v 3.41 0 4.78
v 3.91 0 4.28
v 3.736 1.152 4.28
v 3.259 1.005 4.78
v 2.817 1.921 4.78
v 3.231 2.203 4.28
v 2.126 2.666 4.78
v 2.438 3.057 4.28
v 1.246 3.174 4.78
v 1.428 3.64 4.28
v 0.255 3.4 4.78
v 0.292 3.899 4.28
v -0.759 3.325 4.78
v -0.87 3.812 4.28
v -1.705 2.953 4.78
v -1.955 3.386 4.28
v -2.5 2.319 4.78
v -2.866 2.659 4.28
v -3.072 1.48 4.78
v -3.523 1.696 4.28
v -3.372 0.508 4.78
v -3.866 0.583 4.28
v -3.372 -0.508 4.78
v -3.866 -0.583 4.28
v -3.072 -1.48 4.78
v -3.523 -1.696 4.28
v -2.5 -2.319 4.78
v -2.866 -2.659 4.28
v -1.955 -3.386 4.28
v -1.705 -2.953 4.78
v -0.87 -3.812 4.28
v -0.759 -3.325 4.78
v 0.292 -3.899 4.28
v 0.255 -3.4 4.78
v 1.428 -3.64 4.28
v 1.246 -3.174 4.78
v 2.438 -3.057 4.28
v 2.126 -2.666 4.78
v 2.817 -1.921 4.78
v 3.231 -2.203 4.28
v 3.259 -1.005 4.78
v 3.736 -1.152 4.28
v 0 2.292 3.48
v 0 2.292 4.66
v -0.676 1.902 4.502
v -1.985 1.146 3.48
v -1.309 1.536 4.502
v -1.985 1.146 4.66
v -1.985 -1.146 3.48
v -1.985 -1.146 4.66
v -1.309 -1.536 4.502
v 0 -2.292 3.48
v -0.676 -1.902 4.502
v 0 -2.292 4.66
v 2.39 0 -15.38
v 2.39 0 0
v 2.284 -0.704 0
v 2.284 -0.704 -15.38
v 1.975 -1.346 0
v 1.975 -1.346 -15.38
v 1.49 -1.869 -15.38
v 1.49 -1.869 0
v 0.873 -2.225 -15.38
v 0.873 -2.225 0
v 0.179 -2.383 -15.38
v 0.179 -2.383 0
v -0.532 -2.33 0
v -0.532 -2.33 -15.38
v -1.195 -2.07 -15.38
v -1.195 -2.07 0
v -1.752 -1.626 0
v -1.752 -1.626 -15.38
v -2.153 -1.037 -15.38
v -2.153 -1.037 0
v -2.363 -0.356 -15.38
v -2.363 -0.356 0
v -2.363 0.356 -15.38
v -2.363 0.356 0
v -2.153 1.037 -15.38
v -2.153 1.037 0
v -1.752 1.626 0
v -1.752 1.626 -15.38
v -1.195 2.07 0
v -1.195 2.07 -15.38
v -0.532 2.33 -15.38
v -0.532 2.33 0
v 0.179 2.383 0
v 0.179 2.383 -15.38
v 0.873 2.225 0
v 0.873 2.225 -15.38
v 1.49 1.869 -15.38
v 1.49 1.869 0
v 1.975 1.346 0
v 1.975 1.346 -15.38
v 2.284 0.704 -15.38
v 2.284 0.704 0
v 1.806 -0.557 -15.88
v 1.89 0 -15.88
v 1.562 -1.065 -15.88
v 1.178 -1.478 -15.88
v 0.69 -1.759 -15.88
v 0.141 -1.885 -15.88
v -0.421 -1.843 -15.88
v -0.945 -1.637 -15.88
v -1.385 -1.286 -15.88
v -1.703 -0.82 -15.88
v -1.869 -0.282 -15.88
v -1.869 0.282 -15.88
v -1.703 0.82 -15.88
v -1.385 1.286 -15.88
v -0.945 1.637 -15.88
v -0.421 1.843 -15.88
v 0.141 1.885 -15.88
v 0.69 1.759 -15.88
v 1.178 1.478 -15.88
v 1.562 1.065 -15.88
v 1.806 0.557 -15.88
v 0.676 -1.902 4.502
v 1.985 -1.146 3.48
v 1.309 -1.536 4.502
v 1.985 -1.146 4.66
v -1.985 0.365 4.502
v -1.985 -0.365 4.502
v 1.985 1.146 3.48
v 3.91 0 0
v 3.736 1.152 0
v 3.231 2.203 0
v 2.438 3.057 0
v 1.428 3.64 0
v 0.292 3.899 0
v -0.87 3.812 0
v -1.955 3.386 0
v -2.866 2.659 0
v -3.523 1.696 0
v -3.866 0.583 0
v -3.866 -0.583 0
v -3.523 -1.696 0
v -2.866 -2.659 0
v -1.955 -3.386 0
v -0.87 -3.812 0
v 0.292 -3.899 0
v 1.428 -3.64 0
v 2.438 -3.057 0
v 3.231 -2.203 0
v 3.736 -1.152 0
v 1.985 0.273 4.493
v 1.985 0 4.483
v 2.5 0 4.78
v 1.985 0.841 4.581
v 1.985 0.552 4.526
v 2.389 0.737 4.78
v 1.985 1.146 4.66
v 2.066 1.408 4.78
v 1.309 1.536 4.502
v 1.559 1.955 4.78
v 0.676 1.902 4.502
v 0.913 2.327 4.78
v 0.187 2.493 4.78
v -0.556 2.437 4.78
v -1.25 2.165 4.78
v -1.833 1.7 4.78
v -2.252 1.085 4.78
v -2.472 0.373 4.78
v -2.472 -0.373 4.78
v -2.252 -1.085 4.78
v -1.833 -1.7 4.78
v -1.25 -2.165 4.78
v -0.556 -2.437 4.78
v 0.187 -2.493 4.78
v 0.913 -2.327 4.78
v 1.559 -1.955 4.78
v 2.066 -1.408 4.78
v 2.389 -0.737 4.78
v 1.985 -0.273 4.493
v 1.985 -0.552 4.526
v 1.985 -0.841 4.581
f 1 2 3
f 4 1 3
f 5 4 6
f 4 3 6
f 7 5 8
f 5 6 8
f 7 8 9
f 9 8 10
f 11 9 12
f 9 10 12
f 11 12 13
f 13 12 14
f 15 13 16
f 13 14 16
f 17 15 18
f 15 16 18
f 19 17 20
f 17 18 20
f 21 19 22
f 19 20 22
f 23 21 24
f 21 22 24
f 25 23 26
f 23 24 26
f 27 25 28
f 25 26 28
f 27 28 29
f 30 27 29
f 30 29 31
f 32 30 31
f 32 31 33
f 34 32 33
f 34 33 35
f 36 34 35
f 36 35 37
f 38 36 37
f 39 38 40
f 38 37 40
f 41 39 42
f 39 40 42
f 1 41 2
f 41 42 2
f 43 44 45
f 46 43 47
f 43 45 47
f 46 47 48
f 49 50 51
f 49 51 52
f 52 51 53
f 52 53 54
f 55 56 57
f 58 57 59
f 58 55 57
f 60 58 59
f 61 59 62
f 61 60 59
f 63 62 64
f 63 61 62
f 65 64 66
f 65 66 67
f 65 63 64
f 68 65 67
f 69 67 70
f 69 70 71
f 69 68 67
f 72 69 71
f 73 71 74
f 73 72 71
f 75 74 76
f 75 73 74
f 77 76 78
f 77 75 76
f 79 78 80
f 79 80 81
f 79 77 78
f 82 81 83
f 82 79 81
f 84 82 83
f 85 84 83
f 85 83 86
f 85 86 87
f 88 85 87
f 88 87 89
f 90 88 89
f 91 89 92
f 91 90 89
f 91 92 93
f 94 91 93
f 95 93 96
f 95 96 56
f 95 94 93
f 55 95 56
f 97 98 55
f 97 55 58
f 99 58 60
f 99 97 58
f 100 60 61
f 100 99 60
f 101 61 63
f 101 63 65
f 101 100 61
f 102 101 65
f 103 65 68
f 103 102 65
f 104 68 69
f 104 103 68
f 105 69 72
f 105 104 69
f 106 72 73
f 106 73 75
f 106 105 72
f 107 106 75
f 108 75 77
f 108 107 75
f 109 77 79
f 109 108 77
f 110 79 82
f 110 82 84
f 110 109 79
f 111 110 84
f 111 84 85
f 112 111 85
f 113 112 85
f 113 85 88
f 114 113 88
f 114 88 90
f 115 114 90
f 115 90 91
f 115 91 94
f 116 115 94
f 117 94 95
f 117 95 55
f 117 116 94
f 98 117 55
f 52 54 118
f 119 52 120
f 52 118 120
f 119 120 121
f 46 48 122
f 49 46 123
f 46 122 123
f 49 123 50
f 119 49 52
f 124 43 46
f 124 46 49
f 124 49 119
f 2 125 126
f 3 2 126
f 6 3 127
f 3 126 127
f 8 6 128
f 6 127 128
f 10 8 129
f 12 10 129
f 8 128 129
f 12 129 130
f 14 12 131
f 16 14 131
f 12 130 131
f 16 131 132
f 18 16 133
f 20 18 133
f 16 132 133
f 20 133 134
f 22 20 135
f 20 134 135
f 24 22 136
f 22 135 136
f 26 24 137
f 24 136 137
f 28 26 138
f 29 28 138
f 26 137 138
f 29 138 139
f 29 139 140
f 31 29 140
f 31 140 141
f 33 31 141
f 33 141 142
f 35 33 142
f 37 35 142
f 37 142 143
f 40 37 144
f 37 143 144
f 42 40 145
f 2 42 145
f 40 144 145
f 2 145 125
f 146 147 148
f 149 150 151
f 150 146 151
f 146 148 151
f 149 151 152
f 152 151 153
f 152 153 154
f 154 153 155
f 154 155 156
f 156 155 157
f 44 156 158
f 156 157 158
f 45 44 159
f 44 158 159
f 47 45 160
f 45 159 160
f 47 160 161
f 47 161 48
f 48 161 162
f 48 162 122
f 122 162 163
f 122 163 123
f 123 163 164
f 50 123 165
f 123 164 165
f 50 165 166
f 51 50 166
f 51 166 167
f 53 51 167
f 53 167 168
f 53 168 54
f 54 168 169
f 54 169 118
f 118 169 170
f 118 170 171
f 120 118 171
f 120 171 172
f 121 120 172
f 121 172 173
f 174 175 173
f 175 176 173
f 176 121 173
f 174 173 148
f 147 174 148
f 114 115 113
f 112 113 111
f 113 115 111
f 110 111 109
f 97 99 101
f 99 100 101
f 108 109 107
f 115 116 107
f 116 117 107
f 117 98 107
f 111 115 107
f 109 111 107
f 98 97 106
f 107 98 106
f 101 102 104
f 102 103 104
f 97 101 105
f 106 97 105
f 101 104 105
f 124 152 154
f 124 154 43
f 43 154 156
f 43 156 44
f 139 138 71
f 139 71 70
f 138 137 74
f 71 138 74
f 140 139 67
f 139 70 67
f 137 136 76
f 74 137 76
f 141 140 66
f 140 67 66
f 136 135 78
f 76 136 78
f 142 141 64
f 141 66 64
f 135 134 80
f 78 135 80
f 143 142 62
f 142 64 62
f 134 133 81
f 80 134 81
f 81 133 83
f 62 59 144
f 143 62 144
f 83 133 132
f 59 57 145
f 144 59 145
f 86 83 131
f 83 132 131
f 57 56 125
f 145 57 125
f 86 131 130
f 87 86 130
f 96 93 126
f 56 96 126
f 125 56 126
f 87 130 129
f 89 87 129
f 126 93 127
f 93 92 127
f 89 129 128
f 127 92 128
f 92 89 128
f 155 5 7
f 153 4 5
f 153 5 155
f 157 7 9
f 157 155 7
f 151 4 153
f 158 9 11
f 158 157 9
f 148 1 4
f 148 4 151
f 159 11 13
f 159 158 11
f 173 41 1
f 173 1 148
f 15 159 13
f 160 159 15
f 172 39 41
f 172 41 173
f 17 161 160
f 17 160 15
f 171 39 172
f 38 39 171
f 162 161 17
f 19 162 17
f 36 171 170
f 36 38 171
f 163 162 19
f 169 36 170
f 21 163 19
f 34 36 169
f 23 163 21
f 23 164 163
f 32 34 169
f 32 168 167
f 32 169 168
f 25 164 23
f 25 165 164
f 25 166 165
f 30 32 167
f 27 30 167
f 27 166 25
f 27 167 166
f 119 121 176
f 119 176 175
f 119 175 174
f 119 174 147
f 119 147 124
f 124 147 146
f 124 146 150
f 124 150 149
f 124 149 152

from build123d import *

# Parameters (mm, degrees)
SKE1_R          = 3.91
BASE1_DEPTH     = 4.78
BODYSKE_W       = 20.66
BODYSKE_H       = 2.39
HEX_2_DEPTH     = 1.3
SKE9_R          = 2.5
CHAMFER_2_DEPTH = 1.3
CHAMFER_2_DRAFT = -60
CHAMFER1_SIZE   = 0.5


with BuildPart() as part:
    # Ske1 → Base1 (new body)
    with BuildSketch(Plane.XY):
        Circle(SKE1_R)
    extrude(amount=BASE1_DEPTH)

    # BodySke → BaseBody (revolve)
    with BuildSketch(Plane(origin=(0, 0, 0), x_dir=(0, 0, -1), z_dir=(1, 0, 0)), mode=Mode.PRIVATE) as basebody_sk:
        with Locations((5.55, 1.195)):
            Rectangle(BODYSKE_W, BODYSKE_H)
    revolve(basebody_sk.sketch.rotate(Axis((0, 0, 1.385793675), (0, 0, -1)), 90), axis=Axis((0, 0, 1.385793675), (0, 0, -1)))

    # Ske8 → Hex 2 (cut)
    with BuildSketch(Plane.XY.offset(4.78)):
        Polygon((0, 2.292080569), (-1.985, 1.146040284), (-1.985, -1.146040284), (0, -2.292080569), (1.985, -1.146040284), (1.985, 1.146040284), align=None)
    extrude(amount=-HEX_2_DEPTH, mode=Mode.SUBTRACT)


with BuildPart() as chamfer_2_tool:
    # Ske9 → Chamfer 2 (with draft: the straight prism first)
    with BuildSketch(Plane.XY.offset(4.78)):
        Circle(SKE9_R)
    extrude(amount=-CHAMFER_2_DEPTH)
    # Chamfer 2: the draft: its side faces are tilted about the plane it starts from
    chamfer_2_sides = [chamfer_2_tool.faces().sort_by_distance(p)[0] for p in [
        (-2.5, 0, 4.13),
    ]]
    draft(chamfer_2_sides, Plane.XY.offset(4.78), CHAMFER_2_DRAFT)


with BuildPart() as part_1:
    add(part.part)

    # Chamfer 2: cut by chamfer_2_tool
    add(chamfer_2_tool.part, mode=Mode.SUBTRACT)

    # Chamfer1
    chamfer1_edges = [part_1.edges().sort_by_distance(p)[0] for p in [
        (-3.91, 0, 4.78),
        (-2.39, 0, -15.88),
    ]]
    chamfer(chamfer1_edges, length=CHAMFER1_SIZE)


solid = part_1.part
